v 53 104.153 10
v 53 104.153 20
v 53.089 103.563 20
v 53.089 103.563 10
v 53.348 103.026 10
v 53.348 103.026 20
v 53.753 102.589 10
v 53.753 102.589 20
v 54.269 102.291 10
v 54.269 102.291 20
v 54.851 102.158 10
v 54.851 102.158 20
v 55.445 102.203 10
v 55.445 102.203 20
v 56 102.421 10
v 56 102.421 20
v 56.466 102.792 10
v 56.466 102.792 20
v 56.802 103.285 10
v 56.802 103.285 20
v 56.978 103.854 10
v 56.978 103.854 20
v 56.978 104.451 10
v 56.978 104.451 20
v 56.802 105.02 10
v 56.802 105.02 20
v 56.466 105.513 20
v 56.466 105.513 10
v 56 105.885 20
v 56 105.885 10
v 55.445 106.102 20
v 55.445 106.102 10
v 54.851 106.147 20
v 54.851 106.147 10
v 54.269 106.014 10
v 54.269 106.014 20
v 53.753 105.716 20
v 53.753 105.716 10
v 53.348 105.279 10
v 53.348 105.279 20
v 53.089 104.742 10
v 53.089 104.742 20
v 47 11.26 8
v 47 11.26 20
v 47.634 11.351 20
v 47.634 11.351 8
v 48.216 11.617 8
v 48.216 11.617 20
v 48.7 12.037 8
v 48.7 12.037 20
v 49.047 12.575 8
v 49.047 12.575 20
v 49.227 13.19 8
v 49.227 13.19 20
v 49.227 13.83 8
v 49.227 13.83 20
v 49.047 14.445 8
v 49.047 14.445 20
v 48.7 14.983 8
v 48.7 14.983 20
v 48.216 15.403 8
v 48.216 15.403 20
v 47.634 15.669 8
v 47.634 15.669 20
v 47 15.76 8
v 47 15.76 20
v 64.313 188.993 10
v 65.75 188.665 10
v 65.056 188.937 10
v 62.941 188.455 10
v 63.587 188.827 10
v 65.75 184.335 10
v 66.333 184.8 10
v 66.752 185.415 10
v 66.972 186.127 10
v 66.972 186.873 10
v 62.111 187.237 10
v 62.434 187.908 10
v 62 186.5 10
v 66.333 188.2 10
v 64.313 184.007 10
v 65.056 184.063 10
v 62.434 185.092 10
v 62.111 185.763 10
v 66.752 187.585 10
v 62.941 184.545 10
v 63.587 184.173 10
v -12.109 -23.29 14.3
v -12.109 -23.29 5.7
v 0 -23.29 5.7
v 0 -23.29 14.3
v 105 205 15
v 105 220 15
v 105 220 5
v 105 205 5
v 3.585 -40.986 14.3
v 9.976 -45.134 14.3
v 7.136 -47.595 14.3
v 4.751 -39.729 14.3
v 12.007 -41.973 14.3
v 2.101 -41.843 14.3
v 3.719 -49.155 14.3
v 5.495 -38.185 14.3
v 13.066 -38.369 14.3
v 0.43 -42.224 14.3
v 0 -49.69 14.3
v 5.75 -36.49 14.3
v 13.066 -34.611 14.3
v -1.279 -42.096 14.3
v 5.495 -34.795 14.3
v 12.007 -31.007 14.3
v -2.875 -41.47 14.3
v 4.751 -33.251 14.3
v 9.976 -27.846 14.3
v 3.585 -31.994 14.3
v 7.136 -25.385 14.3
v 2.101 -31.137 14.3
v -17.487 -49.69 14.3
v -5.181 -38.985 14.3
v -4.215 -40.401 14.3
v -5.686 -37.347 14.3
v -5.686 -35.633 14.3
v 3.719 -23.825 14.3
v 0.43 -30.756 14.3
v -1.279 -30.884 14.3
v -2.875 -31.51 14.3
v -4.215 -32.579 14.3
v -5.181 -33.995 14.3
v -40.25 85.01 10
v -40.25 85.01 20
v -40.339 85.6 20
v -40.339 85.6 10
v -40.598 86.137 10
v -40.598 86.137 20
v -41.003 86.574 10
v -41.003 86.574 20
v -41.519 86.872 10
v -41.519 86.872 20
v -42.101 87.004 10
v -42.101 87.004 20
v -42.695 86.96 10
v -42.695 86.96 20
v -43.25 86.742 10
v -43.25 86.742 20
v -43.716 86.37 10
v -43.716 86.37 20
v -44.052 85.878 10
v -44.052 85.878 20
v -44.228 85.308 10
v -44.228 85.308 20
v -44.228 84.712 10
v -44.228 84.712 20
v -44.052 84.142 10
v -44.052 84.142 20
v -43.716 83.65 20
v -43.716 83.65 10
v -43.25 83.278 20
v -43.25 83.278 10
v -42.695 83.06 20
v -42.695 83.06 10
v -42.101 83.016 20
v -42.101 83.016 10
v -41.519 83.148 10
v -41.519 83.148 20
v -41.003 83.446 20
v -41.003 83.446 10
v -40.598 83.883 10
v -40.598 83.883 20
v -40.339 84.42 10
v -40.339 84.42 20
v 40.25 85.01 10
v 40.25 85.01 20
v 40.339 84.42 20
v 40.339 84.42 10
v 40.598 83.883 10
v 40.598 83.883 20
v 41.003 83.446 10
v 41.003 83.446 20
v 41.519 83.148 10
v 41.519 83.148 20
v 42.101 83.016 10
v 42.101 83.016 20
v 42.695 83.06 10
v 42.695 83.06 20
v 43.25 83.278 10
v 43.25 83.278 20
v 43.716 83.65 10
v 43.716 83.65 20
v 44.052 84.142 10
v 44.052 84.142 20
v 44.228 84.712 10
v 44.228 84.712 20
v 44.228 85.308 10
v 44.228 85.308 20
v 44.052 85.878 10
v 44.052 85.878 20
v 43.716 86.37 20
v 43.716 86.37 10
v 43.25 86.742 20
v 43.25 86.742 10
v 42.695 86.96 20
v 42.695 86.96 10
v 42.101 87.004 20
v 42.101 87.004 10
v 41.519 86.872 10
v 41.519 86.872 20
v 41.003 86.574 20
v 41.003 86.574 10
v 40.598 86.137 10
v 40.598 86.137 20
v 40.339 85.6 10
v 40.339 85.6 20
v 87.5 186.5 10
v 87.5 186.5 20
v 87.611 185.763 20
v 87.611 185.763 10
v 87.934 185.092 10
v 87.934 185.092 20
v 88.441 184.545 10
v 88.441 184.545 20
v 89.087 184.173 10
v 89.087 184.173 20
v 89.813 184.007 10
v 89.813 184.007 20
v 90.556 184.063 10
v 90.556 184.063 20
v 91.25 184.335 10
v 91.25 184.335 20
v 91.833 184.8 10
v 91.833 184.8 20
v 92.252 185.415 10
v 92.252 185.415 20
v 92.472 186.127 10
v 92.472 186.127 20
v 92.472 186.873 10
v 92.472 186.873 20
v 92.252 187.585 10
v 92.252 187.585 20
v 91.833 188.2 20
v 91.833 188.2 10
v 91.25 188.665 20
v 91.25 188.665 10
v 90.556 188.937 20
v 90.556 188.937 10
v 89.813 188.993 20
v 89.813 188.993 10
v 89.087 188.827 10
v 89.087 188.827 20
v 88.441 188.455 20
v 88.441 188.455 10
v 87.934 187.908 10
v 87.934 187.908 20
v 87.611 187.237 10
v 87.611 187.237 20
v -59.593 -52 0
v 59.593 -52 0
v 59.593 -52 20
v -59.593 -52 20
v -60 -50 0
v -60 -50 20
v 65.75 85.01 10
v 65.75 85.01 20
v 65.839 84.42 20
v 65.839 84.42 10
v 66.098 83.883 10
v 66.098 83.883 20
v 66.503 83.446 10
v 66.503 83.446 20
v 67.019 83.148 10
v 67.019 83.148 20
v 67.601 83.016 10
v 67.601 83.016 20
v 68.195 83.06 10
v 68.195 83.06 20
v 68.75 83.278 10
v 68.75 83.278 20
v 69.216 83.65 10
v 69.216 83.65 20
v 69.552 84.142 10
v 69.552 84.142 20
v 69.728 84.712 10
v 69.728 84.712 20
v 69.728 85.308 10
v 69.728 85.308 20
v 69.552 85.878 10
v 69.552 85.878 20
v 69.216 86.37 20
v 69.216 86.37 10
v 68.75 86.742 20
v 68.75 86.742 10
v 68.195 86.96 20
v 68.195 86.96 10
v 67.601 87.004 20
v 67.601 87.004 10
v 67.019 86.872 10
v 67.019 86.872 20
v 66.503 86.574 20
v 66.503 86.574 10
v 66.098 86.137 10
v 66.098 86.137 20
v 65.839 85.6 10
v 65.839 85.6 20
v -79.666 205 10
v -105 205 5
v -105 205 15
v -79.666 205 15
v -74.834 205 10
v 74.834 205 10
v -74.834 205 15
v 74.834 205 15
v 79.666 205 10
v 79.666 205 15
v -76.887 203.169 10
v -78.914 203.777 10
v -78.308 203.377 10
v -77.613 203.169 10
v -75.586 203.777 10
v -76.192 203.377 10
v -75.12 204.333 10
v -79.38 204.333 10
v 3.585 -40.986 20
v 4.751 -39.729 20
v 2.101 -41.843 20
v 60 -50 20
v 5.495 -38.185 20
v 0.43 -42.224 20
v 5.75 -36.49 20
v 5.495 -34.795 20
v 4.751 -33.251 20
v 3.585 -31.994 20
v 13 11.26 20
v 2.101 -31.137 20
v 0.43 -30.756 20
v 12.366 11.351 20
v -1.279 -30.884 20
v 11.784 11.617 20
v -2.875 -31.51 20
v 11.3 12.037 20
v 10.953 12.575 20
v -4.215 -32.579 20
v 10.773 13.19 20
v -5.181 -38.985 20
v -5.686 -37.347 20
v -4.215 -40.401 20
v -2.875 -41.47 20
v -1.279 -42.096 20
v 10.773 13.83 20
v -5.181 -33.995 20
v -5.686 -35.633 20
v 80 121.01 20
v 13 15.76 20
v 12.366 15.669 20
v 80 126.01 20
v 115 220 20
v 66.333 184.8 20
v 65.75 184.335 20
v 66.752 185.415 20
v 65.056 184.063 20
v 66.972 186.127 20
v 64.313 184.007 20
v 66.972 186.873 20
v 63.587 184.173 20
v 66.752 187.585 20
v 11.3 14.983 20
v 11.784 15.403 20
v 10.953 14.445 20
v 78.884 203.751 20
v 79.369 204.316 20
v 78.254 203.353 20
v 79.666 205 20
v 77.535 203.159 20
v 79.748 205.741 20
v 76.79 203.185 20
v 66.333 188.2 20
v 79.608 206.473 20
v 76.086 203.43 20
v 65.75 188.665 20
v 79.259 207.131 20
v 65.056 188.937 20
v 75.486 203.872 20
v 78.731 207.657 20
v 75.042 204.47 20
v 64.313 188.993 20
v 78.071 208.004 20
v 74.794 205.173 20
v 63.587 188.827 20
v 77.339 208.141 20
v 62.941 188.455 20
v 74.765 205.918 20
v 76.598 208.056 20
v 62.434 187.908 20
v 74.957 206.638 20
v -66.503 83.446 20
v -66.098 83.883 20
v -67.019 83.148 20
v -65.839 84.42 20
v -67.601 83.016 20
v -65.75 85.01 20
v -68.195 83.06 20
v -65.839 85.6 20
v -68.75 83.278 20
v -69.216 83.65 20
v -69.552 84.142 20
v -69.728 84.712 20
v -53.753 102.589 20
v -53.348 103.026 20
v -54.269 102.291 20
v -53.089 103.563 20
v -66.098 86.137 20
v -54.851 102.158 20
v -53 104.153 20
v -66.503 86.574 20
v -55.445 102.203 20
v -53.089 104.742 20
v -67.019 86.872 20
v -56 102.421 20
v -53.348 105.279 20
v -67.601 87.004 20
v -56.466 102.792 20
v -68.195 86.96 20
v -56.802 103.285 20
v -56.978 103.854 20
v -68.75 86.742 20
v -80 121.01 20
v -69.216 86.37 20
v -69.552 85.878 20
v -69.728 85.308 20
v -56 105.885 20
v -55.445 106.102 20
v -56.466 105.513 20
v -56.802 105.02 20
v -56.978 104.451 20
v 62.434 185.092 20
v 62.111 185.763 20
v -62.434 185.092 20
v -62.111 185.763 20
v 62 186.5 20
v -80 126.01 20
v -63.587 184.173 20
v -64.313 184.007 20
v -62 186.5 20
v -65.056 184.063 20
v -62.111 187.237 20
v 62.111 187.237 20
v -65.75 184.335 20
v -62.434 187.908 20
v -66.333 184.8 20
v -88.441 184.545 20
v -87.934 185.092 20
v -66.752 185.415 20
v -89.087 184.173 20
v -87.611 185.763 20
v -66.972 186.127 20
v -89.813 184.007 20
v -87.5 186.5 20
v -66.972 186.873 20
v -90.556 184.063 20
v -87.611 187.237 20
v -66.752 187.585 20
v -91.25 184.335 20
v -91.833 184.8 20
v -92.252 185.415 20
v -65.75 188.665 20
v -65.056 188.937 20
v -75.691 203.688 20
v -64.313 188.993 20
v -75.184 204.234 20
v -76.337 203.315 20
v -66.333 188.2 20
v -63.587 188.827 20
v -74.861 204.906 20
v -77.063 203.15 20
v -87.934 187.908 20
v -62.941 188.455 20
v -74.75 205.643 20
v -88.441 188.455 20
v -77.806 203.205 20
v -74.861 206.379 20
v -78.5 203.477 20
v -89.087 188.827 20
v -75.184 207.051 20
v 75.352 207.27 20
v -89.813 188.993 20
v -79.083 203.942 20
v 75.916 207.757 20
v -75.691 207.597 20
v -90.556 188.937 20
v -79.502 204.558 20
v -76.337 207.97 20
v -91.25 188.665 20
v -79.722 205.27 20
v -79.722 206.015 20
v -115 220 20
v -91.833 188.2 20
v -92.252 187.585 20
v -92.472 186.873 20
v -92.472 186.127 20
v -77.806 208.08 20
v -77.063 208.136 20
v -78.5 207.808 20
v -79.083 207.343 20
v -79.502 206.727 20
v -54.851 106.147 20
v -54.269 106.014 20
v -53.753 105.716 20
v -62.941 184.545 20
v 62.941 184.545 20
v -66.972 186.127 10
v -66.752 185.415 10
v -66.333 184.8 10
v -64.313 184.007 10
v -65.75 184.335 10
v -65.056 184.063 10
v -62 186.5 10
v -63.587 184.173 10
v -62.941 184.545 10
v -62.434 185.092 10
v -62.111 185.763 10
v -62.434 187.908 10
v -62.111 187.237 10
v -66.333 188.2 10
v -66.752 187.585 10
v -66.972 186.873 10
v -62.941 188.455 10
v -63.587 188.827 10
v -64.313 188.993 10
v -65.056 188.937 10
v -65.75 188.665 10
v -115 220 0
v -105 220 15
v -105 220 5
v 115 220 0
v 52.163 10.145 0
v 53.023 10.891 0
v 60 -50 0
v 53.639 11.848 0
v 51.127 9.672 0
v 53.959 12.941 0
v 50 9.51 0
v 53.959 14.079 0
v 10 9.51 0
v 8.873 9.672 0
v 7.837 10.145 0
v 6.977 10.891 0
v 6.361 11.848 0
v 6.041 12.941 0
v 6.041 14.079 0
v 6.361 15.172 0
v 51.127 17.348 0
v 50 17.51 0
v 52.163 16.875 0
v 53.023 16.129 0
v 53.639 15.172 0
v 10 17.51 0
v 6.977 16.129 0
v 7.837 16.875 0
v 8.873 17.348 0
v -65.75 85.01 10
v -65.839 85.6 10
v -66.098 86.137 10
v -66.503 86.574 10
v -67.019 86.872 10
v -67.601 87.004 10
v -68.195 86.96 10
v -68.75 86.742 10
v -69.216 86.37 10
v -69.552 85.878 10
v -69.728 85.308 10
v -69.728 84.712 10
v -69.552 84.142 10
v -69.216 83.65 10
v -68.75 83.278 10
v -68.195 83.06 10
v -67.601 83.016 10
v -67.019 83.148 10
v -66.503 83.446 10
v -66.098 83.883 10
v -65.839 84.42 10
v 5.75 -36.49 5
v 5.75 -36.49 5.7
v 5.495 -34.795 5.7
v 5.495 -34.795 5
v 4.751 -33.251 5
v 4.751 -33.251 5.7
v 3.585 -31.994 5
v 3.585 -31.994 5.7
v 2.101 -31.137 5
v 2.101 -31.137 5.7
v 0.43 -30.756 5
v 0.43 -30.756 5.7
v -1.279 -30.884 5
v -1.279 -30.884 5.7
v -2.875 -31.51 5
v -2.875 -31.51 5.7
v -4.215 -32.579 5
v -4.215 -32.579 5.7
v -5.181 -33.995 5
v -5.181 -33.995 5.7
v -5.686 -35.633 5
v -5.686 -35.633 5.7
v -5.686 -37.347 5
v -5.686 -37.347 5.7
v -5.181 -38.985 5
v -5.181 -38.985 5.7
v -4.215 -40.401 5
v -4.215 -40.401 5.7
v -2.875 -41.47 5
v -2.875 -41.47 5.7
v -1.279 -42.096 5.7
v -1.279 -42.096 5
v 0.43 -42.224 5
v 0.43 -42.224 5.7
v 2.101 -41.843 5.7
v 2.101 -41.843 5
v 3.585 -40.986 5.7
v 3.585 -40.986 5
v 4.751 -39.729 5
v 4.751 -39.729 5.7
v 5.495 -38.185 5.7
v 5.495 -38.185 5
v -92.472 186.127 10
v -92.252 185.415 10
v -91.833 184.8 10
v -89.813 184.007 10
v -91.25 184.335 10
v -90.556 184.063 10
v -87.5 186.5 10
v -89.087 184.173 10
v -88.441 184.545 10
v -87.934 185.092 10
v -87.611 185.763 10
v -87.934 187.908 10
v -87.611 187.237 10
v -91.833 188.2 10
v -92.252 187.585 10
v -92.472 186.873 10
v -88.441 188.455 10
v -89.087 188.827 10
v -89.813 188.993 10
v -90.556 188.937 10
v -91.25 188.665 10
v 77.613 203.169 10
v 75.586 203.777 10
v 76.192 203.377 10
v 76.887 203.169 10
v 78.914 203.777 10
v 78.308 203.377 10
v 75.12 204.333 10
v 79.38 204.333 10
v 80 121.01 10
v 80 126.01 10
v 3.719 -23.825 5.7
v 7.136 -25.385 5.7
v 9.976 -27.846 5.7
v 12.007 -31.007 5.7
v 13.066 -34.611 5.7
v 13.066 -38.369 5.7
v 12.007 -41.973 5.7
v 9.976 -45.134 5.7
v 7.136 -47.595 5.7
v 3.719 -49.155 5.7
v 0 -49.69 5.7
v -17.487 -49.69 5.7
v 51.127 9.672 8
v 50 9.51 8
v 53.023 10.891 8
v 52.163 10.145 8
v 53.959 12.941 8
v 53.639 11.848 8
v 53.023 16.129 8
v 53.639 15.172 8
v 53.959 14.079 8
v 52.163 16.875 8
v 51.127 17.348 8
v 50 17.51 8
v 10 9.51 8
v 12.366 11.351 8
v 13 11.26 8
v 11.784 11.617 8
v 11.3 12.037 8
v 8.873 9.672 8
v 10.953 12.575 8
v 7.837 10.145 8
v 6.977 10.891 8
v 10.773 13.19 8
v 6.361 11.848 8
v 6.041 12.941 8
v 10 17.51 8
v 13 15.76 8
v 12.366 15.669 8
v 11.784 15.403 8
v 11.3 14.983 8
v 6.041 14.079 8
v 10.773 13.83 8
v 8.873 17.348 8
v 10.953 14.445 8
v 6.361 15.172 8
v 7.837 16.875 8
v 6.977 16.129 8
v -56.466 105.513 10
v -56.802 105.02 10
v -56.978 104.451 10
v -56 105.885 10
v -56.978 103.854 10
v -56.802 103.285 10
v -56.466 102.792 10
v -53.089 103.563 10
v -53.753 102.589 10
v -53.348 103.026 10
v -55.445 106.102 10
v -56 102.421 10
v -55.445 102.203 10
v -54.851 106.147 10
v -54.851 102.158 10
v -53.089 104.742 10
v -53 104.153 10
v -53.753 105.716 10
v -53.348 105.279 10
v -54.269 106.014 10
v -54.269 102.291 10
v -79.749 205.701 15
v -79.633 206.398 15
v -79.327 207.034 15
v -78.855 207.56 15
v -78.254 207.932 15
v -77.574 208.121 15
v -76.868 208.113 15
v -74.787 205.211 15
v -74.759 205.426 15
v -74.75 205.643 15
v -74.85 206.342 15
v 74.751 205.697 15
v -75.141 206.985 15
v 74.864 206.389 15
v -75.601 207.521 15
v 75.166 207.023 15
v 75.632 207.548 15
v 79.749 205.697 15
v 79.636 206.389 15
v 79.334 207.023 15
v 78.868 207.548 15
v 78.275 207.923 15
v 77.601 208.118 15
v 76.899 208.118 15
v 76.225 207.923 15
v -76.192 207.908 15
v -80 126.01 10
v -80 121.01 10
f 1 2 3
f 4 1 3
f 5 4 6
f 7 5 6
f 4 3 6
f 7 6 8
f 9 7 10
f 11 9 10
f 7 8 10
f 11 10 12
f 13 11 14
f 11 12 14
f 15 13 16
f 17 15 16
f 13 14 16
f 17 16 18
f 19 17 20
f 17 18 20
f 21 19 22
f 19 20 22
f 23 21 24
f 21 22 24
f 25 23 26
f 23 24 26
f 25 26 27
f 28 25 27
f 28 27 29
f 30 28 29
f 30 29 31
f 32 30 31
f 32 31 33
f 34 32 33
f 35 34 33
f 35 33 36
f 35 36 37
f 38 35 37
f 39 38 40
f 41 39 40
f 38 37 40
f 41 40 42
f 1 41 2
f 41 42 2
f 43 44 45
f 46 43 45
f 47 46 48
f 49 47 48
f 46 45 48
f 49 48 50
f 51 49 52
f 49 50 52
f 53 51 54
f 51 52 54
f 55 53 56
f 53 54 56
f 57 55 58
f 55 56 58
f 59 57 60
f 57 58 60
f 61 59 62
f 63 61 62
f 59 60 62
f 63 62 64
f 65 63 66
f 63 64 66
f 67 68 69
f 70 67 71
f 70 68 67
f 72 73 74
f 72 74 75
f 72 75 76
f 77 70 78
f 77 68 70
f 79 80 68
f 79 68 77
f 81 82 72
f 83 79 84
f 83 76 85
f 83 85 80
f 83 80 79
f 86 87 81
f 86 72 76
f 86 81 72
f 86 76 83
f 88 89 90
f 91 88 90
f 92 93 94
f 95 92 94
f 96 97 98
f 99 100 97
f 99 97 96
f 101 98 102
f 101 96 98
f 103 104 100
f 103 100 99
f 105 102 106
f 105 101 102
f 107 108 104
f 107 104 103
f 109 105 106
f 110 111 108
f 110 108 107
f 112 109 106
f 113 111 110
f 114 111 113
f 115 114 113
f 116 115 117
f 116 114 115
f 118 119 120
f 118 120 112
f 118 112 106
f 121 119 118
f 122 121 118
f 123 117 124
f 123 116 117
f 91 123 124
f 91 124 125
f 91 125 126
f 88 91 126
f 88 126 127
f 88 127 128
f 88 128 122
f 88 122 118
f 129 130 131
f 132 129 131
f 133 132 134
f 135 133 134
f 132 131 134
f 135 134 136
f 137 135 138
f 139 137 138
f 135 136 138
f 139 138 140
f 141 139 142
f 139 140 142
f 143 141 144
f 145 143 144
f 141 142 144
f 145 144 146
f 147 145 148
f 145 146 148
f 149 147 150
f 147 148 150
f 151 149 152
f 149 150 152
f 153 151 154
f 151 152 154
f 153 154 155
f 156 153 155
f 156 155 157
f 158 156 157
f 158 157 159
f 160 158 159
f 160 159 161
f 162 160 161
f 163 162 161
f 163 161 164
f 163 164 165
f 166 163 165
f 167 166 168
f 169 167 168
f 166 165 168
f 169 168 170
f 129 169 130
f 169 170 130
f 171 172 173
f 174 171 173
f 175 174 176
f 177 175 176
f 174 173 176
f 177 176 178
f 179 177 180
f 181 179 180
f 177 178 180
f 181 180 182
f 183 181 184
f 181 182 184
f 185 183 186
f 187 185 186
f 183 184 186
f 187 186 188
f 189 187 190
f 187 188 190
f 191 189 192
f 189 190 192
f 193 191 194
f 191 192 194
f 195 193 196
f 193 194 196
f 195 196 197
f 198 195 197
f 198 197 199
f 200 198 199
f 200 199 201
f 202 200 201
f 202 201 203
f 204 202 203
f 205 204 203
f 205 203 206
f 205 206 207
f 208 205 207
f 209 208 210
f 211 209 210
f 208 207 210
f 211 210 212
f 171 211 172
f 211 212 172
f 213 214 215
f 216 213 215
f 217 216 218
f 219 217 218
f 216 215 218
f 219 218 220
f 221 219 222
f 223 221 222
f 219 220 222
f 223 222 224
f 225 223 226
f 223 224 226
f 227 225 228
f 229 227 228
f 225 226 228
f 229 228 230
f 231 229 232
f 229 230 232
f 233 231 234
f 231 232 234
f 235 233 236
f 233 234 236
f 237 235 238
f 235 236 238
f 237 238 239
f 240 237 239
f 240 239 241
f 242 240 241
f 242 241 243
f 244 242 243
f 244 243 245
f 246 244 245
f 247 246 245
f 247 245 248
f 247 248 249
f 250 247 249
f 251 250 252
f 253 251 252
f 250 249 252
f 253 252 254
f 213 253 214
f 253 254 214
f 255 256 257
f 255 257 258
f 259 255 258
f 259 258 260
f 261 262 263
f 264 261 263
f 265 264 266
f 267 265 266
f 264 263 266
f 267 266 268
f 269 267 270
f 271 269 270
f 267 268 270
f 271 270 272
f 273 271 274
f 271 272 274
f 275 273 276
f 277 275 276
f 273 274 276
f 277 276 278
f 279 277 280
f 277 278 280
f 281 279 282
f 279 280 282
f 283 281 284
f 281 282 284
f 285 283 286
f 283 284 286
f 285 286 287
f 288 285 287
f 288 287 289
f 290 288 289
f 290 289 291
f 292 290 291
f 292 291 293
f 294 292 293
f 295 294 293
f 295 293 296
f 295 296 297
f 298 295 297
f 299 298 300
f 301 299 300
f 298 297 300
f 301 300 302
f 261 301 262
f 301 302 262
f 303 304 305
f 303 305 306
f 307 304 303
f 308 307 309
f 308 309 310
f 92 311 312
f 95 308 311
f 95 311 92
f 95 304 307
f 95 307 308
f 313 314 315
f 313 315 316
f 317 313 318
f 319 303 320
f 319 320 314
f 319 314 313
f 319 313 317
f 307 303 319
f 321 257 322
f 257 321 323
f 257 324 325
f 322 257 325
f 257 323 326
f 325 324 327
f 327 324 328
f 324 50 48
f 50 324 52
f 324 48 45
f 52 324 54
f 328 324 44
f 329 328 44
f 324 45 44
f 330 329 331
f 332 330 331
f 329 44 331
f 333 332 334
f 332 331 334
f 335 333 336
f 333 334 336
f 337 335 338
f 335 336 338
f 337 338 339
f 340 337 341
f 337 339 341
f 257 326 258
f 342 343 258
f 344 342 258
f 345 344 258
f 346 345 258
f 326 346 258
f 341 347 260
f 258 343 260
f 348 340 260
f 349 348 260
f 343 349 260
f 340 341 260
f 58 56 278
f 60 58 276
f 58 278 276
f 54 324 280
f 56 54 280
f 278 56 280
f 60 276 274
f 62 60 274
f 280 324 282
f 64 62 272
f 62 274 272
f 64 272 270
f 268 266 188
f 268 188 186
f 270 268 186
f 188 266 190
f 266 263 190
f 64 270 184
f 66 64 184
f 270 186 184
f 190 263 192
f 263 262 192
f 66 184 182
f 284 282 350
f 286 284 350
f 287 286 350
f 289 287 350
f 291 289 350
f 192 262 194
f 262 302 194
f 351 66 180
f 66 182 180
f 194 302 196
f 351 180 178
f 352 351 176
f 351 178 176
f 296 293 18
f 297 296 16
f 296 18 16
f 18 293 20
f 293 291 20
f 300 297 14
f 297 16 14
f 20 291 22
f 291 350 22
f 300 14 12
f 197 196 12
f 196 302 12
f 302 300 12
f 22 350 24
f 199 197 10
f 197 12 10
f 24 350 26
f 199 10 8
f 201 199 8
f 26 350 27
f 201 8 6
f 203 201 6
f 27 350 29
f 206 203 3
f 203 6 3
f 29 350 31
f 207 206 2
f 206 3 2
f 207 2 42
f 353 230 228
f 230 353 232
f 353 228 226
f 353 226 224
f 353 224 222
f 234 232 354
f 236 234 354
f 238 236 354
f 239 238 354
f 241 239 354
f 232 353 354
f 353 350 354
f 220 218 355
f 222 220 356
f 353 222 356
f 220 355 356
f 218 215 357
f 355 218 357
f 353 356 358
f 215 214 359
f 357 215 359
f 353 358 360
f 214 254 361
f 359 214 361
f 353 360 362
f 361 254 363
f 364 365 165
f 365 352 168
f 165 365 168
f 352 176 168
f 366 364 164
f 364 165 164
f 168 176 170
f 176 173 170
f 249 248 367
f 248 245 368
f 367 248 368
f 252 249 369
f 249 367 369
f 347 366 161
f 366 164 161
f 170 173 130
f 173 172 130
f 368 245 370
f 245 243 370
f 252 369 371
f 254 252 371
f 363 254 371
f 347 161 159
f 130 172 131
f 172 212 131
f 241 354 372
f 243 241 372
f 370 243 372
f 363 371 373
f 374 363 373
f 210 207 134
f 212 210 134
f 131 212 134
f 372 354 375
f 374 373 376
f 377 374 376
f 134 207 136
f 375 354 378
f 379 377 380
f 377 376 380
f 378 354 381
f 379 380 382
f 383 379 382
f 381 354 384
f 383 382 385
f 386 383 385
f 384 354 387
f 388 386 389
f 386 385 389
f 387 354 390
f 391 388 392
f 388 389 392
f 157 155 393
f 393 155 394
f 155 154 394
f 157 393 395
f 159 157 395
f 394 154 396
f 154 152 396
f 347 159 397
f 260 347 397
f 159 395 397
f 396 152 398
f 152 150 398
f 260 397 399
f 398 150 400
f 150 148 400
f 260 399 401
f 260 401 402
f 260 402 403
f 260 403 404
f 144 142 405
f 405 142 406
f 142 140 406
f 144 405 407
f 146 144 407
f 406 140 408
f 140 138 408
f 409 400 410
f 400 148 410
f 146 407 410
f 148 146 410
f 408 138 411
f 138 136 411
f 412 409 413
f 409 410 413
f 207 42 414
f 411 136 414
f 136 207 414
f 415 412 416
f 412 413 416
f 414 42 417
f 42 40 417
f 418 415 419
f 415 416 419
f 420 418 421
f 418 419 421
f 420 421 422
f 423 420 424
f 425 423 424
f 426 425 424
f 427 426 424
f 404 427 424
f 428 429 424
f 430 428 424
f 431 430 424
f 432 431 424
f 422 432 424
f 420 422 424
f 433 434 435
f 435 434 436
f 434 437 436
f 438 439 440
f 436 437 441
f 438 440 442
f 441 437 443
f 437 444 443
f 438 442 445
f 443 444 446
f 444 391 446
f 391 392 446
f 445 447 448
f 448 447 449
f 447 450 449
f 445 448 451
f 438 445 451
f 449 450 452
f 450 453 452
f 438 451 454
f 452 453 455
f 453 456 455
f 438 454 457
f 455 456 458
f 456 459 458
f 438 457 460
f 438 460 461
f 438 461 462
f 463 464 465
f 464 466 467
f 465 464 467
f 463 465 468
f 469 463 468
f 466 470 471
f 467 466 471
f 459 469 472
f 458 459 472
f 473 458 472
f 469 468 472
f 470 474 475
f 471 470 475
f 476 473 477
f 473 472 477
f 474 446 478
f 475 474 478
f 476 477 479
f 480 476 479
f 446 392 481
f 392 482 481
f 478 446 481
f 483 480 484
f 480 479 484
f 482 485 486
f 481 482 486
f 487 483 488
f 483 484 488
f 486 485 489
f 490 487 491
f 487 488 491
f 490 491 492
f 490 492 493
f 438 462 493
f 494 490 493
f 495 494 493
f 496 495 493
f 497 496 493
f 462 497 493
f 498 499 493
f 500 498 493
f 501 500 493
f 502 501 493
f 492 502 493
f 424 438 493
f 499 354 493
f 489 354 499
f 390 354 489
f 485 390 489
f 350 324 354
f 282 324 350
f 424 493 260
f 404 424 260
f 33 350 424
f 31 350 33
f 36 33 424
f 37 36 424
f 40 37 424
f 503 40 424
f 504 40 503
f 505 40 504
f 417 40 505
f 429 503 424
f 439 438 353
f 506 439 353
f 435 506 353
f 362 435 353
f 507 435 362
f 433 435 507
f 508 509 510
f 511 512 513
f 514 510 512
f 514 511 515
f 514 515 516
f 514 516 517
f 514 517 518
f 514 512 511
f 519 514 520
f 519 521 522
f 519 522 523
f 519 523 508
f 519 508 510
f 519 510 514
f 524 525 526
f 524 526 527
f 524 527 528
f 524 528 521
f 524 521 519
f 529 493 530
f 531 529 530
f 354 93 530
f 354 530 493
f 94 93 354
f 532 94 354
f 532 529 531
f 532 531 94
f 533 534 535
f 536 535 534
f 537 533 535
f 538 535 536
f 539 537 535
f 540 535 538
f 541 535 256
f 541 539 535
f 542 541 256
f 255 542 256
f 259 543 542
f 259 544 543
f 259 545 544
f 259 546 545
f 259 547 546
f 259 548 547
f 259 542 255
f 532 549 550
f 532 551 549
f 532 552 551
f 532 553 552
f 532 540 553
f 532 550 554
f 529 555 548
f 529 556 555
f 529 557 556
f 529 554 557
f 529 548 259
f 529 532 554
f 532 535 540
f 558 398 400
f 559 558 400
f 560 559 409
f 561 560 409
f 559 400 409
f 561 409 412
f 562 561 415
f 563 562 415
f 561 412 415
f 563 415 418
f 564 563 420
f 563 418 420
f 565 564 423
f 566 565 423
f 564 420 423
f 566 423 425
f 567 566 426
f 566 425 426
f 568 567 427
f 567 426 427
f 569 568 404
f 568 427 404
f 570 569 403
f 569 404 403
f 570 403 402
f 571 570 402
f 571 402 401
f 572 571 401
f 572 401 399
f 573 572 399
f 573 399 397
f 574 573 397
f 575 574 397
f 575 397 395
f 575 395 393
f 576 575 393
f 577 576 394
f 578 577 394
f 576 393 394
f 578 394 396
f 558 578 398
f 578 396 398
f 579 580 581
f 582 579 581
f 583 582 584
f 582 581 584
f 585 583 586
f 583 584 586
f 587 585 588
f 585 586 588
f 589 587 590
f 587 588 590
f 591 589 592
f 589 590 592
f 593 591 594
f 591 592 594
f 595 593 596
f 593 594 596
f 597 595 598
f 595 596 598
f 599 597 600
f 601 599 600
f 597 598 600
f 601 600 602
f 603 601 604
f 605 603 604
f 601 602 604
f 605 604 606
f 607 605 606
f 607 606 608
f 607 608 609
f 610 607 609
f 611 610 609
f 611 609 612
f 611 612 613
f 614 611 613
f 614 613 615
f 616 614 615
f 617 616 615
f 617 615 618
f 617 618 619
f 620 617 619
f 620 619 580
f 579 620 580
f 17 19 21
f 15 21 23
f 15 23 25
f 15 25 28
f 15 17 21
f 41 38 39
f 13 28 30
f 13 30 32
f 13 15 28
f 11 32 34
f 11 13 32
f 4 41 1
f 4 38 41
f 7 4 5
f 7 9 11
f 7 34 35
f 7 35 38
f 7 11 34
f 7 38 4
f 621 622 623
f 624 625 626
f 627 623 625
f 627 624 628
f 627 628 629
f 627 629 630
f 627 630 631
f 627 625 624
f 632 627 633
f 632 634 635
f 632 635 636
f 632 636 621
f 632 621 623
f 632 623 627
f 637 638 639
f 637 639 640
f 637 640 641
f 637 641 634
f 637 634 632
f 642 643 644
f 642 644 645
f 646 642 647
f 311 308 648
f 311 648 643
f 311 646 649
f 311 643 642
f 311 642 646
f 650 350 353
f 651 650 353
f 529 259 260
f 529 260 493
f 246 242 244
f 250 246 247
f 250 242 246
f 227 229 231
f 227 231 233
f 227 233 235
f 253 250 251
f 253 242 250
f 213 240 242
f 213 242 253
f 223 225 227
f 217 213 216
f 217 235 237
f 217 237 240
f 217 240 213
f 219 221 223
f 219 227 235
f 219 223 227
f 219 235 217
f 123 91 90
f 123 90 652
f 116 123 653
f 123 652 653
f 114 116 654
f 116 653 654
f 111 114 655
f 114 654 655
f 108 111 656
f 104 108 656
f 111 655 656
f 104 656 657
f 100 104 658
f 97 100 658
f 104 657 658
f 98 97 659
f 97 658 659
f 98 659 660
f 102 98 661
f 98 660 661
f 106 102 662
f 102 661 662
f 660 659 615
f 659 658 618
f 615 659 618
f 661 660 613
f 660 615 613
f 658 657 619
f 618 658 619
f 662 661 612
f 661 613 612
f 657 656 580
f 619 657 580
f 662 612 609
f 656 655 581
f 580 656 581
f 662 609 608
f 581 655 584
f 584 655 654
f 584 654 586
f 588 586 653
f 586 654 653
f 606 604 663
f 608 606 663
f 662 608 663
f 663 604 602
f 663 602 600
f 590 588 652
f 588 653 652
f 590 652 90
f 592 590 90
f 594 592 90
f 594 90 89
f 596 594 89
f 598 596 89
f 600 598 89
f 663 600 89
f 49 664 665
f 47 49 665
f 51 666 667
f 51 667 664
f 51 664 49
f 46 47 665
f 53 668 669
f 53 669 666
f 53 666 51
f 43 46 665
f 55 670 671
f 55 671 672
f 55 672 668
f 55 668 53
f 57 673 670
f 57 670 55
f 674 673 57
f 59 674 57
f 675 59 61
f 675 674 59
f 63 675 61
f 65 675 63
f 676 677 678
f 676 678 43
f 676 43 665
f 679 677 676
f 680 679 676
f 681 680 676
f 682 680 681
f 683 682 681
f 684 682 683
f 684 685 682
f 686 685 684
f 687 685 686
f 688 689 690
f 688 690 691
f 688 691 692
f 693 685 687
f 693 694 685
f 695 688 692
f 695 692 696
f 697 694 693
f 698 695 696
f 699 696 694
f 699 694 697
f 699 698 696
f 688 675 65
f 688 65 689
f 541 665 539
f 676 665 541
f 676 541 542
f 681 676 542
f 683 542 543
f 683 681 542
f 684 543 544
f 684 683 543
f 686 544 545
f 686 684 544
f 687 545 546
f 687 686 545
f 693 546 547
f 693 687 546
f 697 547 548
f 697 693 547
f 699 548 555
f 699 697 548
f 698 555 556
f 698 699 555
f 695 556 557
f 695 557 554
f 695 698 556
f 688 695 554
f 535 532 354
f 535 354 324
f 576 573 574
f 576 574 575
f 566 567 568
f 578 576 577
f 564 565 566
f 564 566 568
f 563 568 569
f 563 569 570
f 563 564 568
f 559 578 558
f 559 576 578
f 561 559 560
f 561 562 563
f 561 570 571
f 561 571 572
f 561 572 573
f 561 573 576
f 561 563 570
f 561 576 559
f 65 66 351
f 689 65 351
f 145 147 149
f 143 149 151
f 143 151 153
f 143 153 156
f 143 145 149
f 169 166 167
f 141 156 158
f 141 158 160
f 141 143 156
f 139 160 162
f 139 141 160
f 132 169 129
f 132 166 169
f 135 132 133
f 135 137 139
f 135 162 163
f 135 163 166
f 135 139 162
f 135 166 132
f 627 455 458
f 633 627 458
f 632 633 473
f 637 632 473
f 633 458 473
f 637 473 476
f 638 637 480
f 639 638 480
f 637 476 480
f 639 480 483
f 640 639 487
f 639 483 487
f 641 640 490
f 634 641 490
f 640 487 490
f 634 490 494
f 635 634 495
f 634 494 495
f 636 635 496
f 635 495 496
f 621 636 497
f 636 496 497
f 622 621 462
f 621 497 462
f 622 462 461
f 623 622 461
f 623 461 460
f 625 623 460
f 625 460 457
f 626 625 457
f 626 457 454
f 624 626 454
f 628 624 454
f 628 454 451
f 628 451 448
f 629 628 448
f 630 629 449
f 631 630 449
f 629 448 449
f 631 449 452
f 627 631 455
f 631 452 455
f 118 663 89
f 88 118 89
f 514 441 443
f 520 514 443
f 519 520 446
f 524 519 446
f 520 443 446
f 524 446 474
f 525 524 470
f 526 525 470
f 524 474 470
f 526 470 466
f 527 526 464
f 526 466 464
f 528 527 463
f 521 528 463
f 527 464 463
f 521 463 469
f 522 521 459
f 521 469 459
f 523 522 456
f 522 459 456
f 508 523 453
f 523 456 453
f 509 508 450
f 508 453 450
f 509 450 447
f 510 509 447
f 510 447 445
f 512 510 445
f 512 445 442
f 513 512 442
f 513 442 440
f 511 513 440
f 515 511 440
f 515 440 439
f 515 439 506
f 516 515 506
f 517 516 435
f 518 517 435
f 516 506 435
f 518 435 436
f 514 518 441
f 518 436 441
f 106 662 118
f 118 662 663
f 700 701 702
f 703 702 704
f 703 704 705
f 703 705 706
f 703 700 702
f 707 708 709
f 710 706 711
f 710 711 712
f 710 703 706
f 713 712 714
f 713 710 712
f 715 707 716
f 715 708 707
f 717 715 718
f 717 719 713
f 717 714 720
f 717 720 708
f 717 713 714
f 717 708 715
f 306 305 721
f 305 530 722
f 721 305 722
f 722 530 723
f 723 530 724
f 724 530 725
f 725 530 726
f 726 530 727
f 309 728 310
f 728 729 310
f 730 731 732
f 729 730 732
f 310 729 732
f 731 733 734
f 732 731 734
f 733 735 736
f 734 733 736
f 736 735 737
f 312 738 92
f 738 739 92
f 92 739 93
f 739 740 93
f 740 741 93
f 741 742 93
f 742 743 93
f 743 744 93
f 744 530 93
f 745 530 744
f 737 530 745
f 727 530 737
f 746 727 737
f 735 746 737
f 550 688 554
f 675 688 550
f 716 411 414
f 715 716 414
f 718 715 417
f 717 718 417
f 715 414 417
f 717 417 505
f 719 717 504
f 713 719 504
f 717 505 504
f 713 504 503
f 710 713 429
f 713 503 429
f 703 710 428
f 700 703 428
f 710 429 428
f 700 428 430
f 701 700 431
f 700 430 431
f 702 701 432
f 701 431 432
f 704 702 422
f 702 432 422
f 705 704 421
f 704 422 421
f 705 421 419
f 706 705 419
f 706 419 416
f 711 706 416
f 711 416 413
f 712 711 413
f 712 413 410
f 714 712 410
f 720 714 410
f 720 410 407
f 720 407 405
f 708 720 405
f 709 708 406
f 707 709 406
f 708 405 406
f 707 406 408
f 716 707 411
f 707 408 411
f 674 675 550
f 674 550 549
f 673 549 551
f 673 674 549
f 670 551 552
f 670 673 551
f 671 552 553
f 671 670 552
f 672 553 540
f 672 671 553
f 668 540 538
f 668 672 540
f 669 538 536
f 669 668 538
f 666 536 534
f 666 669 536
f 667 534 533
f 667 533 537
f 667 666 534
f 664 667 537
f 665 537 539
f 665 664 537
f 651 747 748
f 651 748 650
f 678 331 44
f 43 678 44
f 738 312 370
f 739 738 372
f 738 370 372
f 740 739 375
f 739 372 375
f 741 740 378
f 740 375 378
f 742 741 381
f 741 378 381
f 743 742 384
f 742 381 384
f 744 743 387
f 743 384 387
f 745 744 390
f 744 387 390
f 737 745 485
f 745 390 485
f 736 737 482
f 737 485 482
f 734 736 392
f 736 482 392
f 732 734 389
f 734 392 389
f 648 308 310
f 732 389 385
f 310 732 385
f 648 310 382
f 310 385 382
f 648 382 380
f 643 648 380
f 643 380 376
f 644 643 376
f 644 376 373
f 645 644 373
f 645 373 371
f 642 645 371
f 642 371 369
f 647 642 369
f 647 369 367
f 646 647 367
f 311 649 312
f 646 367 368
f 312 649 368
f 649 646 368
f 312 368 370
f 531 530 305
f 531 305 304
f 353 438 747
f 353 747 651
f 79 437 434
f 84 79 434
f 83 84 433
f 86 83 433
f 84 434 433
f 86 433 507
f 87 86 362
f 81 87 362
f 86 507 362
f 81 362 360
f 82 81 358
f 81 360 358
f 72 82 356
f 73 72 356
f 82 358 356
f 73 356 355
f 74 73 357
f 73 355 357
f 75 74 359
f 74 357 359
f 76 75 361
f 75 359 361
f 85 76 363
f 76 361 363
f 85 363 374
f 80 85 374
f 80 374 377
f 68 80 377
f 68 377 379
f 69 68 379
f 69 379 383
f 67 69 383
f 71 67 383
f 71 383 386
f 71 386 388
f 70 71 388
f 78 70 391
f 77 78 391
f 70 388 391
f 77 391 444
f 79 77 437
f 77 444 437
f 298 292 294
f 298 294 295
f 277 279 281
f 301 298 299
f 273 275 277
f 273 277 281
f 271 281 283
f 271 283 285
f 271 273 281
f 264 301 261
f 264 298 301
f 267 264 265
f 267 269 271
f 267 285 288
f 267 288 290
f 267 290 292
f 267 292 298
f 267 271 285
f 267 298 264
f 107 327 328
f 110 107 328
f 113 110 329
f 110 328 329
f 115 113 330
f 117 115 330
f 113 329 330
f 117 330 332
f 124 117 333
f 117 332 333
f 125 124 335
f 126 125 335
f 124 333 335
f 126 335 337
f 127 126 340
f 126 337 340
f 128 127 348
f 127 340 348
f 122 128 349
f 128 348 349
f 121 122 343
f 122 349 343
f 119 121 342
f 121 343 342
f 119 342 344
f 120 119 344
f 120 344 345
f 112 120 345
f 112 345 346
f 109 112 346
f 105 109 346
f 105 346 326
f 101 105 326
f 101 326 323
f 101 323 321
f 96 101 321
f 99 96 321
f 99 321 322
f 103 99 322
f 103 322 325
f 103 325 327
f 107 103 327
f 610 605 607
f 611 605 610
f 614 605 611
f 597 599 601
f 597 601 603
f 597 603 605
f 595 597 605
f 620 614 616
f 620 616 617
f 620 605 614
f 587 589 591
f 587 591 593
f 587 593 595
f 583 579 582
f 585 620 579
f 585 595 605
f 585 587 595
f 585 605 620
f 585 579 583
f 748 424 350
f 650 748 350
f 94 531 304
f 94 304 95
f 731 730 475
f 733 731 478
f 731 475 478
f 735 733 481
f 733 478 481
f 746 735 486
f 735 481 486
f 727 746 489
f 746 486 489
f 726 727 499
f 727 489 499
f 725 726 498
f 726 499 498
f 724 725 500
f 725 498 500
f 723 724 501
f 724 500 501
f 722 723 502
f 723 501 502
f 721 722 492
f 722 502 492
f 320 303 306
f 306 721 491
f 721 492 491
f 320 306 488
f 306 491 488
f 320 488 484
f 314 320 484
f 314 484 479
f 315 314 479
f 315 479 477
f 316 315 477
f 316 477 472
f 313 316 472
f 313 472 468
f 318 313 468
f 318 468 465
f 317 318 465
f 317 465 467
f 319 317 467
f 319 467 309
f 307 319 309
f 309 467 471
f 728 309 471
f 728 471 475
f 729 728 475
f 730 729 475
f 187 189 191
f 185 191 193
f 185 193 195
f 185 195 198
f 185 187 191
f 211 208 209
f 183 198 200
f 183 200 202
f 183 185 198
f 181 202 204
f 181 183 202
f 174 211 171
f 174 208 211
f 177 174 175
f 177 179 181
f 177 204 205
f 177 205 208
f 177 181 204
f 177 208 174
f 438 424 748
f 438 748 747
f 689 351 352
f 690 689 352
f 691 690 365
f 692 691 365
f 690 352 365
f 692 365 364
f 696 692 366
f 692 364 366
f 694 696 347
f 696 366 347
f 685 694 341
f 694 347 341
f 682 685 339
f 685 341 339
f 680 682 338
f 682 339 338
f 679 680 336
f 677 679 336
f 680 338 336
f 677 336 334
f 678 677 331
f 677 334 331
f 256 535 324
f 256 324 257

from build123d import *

# Parameters (mm, degrees)
EXTRUDE_1_DEPTH     = 20
SKETCH_3_W          = 210
SKETCH_3_H          = 10
CUT_EXTRUDE_1_DEPTH = 15
SKETCH_4_W          = 160
SKETCH_4_H          = 5
CUT_EXTRUDE_2_DEPTH = 10
SKETCH_5_R          = 2.5
SKETCH_5_R_2        = 2
CUT_EXTRUDE_3_DEPTH = 10
CUT_EXTRUDE_4_DEPTH = 4.3
SKETCH_8_R          = 5.75
CUT_EXTRUDE_6_DEPTH = 15
CUT_EXTRUDE_7_DEPTH = 250.048188108
CUT_EXTRUDE_START   = -8
CUT_EXTRUDE_8_DEPTH = 8


with BuildPart() as part:
    # 草图1 → 凸台-拉伸1 (new body)
    with BuildSketch(Plane.XY):
        Polygon((-115, 220), (115, 220), (60, -50), (59.592592593, -52), (-59.592592593, -52), (-60, -50), align=None)
    extrude(amount=EXTRUDE_1_DEPTH)

    # 草图3 → 切除-拉伸1 (cut)
    with BuildSketch(Plane(origin=(0, 220, 0), x_dir=(1, 0, 0), z_dir=(0, 1, 0))):
        with Locations((0, -10)):
            Rectangle(SKETCH_3_W, SKETCH_3_H)
    extrude(amount=-CUT_EXTRUDE_1_DEPTH, mode=Mode.SUBTRACT)

    # 草图4 → 切除-拉伸2 (cut)
    with BuildSketch(Plane.XY.offset(20)):
        with Locations((0, 123.51)):
            Rectangle(SKETCH_4_W, SKETCH_4_H)
    extrude(amount=-CUT_EXTRUDE_2_DEPTH, mode=Mode.SUBTRACT)

    # 草图5 → 切除-拉伸3 (cut)
    with BuildSketch(Plane.XY.offset(20)):
        with Locations((-77.25, 205.6425573)):
            Circle(SKETCH_5_R)
        with Locations((-90, 186.5)):
            Circle(SKETCH_5_R)
        with Locations((-64.5, 186.5)):
            Circle(SKETCH_5_R)
        with Locations((-55, 104.1525573)):
            Circle(SKETCH_5_R_2)
        with Locations((-67.75, 85.01)):
            Circle(SKETCH_5_R_2)
        with Locations((-42.25, 85.01)):
            Circle(SKETCH_5_R_2)
        with Locations(Location((42.25, 85.01, 0), (0, 0, 180))):
            Circle(SKETCH_5_R_2)
        with Locations(Location((67.75, 85.01, 0), (0, 0, 180))):
            Circle(SKETCH_5_R_2)
        with Locations(Location((55, 104.1525573, 0), (0, 0, 180))):
            Circle(SKETCH_5_R_2)
        with Locations(Location((64.5, 186.5, 0), (0, 0, 180))):
            Circle(SKETCH_5_R)
        with Locations(Location((90, 186.5, 0), (0, 0, 180))):
            Circle(SKETCH_5_R)
        with Locations(Location((77.25, 205.6425573, 0), (0, 0, 345.106514196))):
            Circle(SKETCH_5_R)
    extrude(amount=-CUT_EXTRUDE_3_DEPTH, mode=Mode.SUBTRACT)

    # 草图6 → 切除-拉伸4 (cut, symmetric)
    with BuildSketch(Plane(origin=(0, 0, 10), x_dir=(-1, 0, 0), z_dir=(0, 0, -1))):
        with BuildLine():
            Line((0, -49.69), (17.486671343, -49.69))
            Line((17.486671343, -49.69), (12.108893566, -23.29))
            Line((12.108893566, -23.29), (0, -23.29))
            ThreePointArc((0, -23.29), (-13.2, -36.49), (0, -49.69))
        make_face()
    extrude(amount=CUT_EXTRUDE_4_DEPTH, both=True, mode=Mode.SUBTRACT)

    # 草图8 → 切除-拉伸6 (cut)
    with BuildSketch(Plane.XY.offset(20)):
        with Locations((0, -36.49)):
            Circle(SKETCH_8_R)
    extrude(amount=-CUT_EXTRUDE_6_DEPTH, mode=Mode.SUBTRACT)

    # 草图9 → 切除-拉伸7 (cut, through all)
    with BuildSketch(Plane.XY.offset(20)):
        with BuildLine():
            Line((13, 11.26), (47, 11.26))
            ThreePointArc((47, 11.26), (49.25, 13.51), (47, 15.76))
            Line((47, 15.76), (13, 15.76))
            ThreePointArc((13, 15.76), (10.75, 13.51), (13, 11.26))
        make_face()
    extrude(amount=-CUT_EXTRUDE_7_DEPTH, mode=Mode.SUBTRACT)

    # 草图10 → 切除-拉伸8 (cut)
    with BuildSketch(Plane(origin=(0, 0, 0), x_dir=(-1, 0, 0), z_dir=(0, 0, -1)).offset(CUT_EXTRUDE_START)):
        with BuildLine():
            Line((-50, 9.51), (-10, 9.51))
            ThreePointArc((-10, 9.51), (-6, 13.51), (-10, 17.51))
            Line((-10, 17.51), (-50, 17.51))
            ThreePointArc((-50, 17.51), (-54, 13.51), (-50, 9.51))
        make_face()
        with BuildLine():
            Line((-47, 15.76), (-13, 15.76))
            ThreePointArc((-13, 15.76), (-10.75, 13.51), (-13, 11.26))
            Line((-13, 11.26), (-47, 11.26))
            ThreePointArc((-47, 11.26), (-49.25, 13.51), (-47, 15.76))
        make_face(mode=Mode.SUBTRACT)
    extrude(amount=CUT_EXTRUDE_8_DEPTH, mode=Mode.SUBTRACT)


solid = part.part
